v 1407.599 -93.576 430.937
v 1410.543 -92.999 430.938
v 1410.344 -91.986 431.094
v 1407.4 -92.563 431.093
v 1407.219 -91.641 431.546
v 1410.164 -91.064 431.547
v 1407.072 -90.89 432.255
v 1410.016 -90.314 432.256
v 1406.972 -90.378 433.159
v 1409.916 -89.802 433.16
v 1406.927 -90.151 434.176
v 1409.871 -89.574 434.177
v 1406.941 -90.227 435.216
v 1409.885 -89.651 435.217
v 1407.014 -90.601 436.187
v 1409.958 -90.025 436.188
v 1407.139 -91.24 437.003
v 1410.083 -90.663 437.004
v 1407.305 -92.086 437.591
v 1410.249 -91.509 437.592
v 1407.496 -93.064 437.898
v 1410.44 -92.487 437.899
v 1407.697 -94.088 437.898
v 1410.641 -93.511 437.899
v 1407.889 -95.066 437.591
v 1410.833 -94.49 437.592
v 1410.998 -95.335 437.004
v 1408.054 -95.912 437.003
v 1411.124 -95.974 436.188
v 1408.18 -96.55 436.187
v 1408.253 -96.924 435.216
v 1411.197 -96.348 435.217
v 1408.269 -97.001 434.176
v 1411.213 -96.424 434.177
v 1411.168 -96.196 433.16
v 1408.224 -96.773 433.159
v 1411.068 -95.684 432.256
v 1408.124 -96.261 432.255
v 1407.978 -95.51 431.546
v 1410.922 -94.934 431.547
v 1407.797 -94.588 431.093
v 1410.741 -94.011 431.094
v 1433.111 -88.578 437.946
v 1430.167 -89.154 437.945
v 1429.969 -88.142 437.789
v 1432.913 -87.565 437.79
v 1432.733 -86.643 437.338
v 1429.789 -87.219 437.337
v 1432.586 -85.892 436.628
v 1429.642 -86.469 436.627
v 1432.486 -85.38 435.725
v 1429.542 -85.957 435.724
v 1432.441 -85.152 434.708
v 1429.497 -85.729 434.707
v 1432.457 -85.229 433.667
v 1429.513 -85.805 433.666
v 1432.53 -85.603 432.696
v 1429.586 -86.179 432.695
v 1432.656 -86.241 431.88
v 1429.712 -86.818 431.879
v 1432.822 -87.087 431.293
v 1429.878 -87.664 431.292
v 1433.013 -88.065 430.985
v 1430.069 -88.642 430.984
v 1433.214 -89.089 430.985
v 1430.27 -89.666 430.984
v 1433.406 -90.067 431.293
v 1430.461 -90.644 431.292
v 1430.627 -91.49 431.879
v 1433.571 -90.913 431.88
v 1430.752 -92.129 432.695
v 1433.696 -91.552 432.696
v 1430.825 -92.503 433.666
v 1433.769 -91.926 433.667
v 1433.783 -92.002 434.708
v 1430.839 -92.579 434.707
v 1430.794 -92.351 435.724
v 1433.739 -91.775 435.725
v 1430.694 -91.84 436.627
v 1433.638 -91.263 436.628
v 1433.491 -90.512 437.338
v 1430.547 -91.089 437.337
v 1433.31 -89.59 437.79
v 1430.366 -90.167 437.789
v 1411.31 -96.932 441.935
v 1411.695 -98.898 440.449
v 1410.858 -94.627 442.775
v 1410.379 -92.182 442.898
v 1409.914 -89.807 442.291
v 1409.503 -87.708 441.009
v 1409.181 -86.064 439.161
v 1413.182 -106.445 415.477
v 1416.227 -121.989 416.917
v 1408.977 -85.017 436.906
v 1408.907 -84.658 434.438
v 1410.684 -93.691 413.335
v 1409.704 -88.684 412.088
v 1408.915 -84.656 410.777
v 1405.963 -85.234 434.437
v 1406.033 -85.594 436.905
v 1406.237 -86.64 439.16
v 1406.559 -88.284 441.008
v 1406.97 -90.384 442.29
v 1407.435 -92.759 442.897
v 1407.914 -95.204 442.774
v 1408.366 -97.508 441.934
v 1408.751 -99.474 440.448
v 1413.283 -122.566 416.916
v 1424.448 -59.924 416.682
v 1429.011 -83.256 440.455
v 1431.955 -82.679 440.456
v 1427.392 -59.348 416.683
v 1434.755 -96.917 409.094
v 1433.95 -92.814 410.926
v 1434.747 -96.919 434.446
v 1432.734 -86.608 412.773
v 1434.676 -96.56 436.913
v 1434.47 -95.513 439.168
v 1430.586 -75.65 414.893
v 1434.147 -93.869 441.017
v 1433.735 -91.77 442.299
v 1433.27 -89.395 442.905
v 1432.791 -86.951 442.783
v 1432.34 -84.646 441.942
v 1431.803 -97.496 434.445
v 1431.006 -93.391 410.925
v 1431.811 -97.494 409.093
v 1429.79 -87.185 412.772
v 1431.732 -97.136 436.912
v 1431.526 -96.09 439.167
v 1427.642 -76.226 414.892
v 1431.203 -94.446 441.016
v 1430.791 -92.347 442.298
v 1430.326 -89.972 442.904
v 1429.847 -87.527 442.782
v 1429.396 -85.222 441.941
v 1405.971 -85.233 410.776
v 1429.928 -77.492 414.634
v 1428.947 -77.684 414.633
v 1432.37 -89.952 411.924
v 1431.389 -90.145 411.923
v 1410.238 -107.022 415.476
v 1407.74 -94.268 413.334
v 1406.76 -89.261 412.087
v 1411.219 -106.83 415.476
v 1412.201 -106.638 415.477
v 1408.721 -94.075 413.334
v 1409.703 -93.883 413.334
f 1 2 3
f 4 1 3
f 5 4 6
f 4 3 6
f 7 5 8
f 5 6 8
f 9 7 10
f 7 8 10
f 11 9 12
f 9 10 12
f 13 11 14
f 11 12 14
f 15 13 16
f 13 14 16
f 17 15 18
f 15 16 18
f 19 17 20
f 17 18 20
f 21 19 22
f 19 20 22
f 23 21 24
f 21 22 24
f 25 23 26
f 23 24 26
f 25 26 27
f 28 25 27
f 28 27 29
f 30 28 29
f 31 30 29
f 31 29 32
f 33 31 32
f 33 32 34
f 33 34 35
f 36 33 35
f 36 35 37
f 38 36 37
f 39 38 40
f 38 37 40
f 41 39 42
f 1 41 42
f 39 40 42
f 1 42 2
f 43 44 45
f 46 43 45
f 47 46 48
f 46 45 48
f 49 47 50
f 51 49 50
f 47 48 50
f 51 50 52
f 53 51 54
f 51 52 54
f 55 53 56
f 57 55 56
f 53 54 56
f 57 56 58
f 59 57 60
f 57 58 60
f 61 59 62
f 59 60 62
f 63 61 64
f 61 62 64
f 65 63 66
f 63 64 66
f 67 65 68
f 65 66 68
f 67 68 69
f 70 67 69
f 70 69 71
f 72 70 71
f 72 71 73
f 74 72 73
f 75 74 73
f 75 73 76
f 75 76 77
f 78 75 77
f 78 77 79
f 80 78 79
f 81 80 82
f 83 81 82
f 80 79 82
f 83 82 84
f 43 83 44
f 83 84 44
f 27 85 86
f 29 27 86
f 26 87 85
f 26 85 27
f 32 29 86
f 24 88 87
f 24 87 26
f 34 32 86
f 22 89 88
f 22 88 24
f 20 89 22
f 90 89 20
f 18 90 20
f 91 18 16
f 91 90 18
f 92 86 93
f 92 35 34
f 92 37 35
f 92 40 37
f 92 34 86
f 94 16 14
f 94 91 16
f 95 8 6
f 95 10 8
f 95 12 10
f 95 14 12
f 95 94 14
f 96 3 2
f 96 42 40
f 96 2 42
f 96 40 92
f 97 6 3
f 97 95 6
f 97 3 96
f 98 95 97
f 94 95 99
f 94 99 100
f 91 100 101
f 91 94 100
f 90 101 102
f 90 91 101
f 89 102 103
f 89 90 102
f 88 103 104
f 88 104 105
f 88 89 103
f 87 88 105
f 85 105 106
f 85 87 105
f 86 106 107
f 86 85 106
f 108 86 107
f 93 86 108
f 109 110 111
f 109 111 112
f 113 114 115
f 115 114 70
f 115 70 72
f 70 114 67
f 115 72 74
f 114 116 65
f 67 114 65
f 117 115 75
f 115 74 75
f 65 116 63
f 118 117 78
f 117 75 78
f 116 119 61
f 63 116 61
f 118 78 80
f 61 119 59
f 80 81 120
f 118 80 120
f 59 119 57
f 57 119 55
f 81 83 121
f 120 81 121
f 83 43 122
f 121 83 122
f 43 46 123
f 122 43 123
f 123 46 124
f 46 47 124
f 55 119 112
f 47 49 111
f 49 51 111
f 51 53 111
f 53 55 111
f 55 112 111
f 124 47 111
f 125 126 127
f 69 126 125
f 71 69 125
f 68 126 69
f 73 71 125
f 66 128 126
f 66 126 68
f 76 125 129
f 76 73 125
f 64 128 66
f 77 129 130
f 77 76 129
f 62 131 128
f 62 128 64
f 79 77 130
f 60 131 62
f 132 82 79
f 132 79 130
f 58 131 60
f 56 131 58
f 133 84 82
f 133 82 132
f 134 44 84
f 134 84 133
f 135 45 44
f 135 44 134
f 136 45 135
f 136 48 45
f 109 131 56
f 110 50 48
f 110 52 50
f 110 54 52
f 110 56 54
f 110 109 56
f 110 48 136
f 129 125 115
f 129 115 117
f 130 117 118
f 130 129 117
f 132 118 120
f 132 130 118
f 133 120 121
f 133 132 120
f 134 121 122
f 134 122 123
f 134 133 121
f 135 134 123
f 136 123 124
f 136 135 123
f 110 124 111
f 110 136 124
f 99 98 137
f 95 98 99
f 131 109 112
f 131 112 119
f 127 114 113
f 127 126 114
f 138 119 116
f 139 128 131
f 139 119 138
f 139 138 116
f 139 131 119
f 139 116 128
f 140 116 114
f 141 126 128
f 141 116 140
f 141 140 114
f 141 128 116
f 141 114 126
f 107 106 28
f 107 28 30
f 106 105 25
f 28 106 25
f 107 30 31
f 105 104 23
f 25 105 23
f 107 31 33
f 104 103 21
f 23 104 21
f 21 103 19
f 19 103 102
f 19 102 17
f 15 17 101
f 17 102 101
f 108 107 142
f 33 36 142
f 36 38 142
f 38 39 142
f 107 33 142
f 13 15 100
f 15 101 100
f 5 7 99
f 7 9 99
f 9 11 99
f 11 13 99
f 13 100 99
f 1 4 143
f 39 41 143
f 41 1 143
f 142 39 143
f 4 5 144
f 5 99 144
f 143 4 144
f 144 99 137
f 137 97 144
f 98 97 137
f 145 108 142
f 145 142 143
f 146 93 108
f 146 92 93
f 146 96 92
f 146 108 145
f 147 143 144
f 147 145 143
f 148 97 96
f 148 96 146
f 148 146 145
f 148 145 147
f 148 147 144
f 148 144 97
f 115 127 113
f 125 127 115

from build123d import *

# Parameters (mm, degrees)
SZKIC1_R                    = 3.5
DODANIE_WYCI_GNI_CIE1_DEPTH = 3
SZKIC2_R                    = 3.5
DODANIE_WYCI_GNI_CIE2_DEPTH = 3


with BuildPart() as part:
    # Szkic1 → Dodanie-wyciągnięcie1 (new body)
    with BuildSketch(Plane(origin=(1360.627920947, 266.553908411, 0.452649646), x_dir=(-0.000320381, -6.2764e-05, 0.999999947), z_dir=(-0.981345807, -0.192250619, -0.000326471))):
        with BuildLine():
            Line((408.64068808, -370.941776368), (433.992356241, -370.941776368))
            ThreePointArc((433.992356241, -370.941776368), (441.845332267, -365.694585543), (440.002763881, -356.431368728))
            Line((440.002763881, -356.431368728), (416.229122465, -332.657727312))
            add(Edge.make_bspline(
                [(416.229122465, -332.657727312), (414.804252129, -352.119194686), (411.949104367, -364.983138219), (408.64068808, -370.941776368)],
                knots=[0.296030426, 0.296030426, 0.296030426, 0.296030426, 0.428007656, 0.428007656, 0.428007656, 0.428007656], degree=3, weights=[0.516950401, 0.549350231, 0.628198033, 0.753493806]))
        make_face()
        with Locations((433.992356241, -362.441776368)):
            Circle(SZKIC1_R, mode=Mode.SUBTRACT)
    extrude(amount=-DODANIE_WYCI_GNI_CIE1_DEPTH)


with BuildPart() as body_2:
    # Szkic2 → Dodanie-wyciągnięcie2 (new body)
    with BuildSketch(Plane(origin=(1341.001004808, 262.708896026, 0.446120222), x_dir=(0.000320381, 6.2764e-05, -0.999999947), z_dir=(0.981345807, 0.192250619, 0.000326471))):
        with BuildLine():
            ThreePointArc((-433.992356241, -353.941776368), (-441.845332267, -359.188967193), (-440.002763881, -368.452184008))
            Line((-440.002763881, -368.452184008), (-416.470812313, -391.984135576))
            add(Edge.make_bspline(
                [(-416.470812313, -391.984135576), (-415.438117523, -375.017376477), (-413.241019551, -361.835375789), (-410.330956854, -353.941776368)],
                knots=[0.231951537, 0.231951537, 0.231951537, 0.231951537, 0.385696539, 0.385696539, 0.385696539, 0.385696539], degree=3, weights=[0.697863065, 0.688873406, 0.718172745, 0.785761082]))
            Line((-410.330956854, -353.941776368), (-433.992356241, -353.941776368))
        make_face()
        with Locations((-433.992356241, -362.441776368)):
            Circle(SZKIC2_R, mode=Mode.SUBTRACT)
    extrude(amount=-DODANIE_WYCI_GNI_CIE2_DEPTH)


solid = Compound([part.part, body_2.part])
